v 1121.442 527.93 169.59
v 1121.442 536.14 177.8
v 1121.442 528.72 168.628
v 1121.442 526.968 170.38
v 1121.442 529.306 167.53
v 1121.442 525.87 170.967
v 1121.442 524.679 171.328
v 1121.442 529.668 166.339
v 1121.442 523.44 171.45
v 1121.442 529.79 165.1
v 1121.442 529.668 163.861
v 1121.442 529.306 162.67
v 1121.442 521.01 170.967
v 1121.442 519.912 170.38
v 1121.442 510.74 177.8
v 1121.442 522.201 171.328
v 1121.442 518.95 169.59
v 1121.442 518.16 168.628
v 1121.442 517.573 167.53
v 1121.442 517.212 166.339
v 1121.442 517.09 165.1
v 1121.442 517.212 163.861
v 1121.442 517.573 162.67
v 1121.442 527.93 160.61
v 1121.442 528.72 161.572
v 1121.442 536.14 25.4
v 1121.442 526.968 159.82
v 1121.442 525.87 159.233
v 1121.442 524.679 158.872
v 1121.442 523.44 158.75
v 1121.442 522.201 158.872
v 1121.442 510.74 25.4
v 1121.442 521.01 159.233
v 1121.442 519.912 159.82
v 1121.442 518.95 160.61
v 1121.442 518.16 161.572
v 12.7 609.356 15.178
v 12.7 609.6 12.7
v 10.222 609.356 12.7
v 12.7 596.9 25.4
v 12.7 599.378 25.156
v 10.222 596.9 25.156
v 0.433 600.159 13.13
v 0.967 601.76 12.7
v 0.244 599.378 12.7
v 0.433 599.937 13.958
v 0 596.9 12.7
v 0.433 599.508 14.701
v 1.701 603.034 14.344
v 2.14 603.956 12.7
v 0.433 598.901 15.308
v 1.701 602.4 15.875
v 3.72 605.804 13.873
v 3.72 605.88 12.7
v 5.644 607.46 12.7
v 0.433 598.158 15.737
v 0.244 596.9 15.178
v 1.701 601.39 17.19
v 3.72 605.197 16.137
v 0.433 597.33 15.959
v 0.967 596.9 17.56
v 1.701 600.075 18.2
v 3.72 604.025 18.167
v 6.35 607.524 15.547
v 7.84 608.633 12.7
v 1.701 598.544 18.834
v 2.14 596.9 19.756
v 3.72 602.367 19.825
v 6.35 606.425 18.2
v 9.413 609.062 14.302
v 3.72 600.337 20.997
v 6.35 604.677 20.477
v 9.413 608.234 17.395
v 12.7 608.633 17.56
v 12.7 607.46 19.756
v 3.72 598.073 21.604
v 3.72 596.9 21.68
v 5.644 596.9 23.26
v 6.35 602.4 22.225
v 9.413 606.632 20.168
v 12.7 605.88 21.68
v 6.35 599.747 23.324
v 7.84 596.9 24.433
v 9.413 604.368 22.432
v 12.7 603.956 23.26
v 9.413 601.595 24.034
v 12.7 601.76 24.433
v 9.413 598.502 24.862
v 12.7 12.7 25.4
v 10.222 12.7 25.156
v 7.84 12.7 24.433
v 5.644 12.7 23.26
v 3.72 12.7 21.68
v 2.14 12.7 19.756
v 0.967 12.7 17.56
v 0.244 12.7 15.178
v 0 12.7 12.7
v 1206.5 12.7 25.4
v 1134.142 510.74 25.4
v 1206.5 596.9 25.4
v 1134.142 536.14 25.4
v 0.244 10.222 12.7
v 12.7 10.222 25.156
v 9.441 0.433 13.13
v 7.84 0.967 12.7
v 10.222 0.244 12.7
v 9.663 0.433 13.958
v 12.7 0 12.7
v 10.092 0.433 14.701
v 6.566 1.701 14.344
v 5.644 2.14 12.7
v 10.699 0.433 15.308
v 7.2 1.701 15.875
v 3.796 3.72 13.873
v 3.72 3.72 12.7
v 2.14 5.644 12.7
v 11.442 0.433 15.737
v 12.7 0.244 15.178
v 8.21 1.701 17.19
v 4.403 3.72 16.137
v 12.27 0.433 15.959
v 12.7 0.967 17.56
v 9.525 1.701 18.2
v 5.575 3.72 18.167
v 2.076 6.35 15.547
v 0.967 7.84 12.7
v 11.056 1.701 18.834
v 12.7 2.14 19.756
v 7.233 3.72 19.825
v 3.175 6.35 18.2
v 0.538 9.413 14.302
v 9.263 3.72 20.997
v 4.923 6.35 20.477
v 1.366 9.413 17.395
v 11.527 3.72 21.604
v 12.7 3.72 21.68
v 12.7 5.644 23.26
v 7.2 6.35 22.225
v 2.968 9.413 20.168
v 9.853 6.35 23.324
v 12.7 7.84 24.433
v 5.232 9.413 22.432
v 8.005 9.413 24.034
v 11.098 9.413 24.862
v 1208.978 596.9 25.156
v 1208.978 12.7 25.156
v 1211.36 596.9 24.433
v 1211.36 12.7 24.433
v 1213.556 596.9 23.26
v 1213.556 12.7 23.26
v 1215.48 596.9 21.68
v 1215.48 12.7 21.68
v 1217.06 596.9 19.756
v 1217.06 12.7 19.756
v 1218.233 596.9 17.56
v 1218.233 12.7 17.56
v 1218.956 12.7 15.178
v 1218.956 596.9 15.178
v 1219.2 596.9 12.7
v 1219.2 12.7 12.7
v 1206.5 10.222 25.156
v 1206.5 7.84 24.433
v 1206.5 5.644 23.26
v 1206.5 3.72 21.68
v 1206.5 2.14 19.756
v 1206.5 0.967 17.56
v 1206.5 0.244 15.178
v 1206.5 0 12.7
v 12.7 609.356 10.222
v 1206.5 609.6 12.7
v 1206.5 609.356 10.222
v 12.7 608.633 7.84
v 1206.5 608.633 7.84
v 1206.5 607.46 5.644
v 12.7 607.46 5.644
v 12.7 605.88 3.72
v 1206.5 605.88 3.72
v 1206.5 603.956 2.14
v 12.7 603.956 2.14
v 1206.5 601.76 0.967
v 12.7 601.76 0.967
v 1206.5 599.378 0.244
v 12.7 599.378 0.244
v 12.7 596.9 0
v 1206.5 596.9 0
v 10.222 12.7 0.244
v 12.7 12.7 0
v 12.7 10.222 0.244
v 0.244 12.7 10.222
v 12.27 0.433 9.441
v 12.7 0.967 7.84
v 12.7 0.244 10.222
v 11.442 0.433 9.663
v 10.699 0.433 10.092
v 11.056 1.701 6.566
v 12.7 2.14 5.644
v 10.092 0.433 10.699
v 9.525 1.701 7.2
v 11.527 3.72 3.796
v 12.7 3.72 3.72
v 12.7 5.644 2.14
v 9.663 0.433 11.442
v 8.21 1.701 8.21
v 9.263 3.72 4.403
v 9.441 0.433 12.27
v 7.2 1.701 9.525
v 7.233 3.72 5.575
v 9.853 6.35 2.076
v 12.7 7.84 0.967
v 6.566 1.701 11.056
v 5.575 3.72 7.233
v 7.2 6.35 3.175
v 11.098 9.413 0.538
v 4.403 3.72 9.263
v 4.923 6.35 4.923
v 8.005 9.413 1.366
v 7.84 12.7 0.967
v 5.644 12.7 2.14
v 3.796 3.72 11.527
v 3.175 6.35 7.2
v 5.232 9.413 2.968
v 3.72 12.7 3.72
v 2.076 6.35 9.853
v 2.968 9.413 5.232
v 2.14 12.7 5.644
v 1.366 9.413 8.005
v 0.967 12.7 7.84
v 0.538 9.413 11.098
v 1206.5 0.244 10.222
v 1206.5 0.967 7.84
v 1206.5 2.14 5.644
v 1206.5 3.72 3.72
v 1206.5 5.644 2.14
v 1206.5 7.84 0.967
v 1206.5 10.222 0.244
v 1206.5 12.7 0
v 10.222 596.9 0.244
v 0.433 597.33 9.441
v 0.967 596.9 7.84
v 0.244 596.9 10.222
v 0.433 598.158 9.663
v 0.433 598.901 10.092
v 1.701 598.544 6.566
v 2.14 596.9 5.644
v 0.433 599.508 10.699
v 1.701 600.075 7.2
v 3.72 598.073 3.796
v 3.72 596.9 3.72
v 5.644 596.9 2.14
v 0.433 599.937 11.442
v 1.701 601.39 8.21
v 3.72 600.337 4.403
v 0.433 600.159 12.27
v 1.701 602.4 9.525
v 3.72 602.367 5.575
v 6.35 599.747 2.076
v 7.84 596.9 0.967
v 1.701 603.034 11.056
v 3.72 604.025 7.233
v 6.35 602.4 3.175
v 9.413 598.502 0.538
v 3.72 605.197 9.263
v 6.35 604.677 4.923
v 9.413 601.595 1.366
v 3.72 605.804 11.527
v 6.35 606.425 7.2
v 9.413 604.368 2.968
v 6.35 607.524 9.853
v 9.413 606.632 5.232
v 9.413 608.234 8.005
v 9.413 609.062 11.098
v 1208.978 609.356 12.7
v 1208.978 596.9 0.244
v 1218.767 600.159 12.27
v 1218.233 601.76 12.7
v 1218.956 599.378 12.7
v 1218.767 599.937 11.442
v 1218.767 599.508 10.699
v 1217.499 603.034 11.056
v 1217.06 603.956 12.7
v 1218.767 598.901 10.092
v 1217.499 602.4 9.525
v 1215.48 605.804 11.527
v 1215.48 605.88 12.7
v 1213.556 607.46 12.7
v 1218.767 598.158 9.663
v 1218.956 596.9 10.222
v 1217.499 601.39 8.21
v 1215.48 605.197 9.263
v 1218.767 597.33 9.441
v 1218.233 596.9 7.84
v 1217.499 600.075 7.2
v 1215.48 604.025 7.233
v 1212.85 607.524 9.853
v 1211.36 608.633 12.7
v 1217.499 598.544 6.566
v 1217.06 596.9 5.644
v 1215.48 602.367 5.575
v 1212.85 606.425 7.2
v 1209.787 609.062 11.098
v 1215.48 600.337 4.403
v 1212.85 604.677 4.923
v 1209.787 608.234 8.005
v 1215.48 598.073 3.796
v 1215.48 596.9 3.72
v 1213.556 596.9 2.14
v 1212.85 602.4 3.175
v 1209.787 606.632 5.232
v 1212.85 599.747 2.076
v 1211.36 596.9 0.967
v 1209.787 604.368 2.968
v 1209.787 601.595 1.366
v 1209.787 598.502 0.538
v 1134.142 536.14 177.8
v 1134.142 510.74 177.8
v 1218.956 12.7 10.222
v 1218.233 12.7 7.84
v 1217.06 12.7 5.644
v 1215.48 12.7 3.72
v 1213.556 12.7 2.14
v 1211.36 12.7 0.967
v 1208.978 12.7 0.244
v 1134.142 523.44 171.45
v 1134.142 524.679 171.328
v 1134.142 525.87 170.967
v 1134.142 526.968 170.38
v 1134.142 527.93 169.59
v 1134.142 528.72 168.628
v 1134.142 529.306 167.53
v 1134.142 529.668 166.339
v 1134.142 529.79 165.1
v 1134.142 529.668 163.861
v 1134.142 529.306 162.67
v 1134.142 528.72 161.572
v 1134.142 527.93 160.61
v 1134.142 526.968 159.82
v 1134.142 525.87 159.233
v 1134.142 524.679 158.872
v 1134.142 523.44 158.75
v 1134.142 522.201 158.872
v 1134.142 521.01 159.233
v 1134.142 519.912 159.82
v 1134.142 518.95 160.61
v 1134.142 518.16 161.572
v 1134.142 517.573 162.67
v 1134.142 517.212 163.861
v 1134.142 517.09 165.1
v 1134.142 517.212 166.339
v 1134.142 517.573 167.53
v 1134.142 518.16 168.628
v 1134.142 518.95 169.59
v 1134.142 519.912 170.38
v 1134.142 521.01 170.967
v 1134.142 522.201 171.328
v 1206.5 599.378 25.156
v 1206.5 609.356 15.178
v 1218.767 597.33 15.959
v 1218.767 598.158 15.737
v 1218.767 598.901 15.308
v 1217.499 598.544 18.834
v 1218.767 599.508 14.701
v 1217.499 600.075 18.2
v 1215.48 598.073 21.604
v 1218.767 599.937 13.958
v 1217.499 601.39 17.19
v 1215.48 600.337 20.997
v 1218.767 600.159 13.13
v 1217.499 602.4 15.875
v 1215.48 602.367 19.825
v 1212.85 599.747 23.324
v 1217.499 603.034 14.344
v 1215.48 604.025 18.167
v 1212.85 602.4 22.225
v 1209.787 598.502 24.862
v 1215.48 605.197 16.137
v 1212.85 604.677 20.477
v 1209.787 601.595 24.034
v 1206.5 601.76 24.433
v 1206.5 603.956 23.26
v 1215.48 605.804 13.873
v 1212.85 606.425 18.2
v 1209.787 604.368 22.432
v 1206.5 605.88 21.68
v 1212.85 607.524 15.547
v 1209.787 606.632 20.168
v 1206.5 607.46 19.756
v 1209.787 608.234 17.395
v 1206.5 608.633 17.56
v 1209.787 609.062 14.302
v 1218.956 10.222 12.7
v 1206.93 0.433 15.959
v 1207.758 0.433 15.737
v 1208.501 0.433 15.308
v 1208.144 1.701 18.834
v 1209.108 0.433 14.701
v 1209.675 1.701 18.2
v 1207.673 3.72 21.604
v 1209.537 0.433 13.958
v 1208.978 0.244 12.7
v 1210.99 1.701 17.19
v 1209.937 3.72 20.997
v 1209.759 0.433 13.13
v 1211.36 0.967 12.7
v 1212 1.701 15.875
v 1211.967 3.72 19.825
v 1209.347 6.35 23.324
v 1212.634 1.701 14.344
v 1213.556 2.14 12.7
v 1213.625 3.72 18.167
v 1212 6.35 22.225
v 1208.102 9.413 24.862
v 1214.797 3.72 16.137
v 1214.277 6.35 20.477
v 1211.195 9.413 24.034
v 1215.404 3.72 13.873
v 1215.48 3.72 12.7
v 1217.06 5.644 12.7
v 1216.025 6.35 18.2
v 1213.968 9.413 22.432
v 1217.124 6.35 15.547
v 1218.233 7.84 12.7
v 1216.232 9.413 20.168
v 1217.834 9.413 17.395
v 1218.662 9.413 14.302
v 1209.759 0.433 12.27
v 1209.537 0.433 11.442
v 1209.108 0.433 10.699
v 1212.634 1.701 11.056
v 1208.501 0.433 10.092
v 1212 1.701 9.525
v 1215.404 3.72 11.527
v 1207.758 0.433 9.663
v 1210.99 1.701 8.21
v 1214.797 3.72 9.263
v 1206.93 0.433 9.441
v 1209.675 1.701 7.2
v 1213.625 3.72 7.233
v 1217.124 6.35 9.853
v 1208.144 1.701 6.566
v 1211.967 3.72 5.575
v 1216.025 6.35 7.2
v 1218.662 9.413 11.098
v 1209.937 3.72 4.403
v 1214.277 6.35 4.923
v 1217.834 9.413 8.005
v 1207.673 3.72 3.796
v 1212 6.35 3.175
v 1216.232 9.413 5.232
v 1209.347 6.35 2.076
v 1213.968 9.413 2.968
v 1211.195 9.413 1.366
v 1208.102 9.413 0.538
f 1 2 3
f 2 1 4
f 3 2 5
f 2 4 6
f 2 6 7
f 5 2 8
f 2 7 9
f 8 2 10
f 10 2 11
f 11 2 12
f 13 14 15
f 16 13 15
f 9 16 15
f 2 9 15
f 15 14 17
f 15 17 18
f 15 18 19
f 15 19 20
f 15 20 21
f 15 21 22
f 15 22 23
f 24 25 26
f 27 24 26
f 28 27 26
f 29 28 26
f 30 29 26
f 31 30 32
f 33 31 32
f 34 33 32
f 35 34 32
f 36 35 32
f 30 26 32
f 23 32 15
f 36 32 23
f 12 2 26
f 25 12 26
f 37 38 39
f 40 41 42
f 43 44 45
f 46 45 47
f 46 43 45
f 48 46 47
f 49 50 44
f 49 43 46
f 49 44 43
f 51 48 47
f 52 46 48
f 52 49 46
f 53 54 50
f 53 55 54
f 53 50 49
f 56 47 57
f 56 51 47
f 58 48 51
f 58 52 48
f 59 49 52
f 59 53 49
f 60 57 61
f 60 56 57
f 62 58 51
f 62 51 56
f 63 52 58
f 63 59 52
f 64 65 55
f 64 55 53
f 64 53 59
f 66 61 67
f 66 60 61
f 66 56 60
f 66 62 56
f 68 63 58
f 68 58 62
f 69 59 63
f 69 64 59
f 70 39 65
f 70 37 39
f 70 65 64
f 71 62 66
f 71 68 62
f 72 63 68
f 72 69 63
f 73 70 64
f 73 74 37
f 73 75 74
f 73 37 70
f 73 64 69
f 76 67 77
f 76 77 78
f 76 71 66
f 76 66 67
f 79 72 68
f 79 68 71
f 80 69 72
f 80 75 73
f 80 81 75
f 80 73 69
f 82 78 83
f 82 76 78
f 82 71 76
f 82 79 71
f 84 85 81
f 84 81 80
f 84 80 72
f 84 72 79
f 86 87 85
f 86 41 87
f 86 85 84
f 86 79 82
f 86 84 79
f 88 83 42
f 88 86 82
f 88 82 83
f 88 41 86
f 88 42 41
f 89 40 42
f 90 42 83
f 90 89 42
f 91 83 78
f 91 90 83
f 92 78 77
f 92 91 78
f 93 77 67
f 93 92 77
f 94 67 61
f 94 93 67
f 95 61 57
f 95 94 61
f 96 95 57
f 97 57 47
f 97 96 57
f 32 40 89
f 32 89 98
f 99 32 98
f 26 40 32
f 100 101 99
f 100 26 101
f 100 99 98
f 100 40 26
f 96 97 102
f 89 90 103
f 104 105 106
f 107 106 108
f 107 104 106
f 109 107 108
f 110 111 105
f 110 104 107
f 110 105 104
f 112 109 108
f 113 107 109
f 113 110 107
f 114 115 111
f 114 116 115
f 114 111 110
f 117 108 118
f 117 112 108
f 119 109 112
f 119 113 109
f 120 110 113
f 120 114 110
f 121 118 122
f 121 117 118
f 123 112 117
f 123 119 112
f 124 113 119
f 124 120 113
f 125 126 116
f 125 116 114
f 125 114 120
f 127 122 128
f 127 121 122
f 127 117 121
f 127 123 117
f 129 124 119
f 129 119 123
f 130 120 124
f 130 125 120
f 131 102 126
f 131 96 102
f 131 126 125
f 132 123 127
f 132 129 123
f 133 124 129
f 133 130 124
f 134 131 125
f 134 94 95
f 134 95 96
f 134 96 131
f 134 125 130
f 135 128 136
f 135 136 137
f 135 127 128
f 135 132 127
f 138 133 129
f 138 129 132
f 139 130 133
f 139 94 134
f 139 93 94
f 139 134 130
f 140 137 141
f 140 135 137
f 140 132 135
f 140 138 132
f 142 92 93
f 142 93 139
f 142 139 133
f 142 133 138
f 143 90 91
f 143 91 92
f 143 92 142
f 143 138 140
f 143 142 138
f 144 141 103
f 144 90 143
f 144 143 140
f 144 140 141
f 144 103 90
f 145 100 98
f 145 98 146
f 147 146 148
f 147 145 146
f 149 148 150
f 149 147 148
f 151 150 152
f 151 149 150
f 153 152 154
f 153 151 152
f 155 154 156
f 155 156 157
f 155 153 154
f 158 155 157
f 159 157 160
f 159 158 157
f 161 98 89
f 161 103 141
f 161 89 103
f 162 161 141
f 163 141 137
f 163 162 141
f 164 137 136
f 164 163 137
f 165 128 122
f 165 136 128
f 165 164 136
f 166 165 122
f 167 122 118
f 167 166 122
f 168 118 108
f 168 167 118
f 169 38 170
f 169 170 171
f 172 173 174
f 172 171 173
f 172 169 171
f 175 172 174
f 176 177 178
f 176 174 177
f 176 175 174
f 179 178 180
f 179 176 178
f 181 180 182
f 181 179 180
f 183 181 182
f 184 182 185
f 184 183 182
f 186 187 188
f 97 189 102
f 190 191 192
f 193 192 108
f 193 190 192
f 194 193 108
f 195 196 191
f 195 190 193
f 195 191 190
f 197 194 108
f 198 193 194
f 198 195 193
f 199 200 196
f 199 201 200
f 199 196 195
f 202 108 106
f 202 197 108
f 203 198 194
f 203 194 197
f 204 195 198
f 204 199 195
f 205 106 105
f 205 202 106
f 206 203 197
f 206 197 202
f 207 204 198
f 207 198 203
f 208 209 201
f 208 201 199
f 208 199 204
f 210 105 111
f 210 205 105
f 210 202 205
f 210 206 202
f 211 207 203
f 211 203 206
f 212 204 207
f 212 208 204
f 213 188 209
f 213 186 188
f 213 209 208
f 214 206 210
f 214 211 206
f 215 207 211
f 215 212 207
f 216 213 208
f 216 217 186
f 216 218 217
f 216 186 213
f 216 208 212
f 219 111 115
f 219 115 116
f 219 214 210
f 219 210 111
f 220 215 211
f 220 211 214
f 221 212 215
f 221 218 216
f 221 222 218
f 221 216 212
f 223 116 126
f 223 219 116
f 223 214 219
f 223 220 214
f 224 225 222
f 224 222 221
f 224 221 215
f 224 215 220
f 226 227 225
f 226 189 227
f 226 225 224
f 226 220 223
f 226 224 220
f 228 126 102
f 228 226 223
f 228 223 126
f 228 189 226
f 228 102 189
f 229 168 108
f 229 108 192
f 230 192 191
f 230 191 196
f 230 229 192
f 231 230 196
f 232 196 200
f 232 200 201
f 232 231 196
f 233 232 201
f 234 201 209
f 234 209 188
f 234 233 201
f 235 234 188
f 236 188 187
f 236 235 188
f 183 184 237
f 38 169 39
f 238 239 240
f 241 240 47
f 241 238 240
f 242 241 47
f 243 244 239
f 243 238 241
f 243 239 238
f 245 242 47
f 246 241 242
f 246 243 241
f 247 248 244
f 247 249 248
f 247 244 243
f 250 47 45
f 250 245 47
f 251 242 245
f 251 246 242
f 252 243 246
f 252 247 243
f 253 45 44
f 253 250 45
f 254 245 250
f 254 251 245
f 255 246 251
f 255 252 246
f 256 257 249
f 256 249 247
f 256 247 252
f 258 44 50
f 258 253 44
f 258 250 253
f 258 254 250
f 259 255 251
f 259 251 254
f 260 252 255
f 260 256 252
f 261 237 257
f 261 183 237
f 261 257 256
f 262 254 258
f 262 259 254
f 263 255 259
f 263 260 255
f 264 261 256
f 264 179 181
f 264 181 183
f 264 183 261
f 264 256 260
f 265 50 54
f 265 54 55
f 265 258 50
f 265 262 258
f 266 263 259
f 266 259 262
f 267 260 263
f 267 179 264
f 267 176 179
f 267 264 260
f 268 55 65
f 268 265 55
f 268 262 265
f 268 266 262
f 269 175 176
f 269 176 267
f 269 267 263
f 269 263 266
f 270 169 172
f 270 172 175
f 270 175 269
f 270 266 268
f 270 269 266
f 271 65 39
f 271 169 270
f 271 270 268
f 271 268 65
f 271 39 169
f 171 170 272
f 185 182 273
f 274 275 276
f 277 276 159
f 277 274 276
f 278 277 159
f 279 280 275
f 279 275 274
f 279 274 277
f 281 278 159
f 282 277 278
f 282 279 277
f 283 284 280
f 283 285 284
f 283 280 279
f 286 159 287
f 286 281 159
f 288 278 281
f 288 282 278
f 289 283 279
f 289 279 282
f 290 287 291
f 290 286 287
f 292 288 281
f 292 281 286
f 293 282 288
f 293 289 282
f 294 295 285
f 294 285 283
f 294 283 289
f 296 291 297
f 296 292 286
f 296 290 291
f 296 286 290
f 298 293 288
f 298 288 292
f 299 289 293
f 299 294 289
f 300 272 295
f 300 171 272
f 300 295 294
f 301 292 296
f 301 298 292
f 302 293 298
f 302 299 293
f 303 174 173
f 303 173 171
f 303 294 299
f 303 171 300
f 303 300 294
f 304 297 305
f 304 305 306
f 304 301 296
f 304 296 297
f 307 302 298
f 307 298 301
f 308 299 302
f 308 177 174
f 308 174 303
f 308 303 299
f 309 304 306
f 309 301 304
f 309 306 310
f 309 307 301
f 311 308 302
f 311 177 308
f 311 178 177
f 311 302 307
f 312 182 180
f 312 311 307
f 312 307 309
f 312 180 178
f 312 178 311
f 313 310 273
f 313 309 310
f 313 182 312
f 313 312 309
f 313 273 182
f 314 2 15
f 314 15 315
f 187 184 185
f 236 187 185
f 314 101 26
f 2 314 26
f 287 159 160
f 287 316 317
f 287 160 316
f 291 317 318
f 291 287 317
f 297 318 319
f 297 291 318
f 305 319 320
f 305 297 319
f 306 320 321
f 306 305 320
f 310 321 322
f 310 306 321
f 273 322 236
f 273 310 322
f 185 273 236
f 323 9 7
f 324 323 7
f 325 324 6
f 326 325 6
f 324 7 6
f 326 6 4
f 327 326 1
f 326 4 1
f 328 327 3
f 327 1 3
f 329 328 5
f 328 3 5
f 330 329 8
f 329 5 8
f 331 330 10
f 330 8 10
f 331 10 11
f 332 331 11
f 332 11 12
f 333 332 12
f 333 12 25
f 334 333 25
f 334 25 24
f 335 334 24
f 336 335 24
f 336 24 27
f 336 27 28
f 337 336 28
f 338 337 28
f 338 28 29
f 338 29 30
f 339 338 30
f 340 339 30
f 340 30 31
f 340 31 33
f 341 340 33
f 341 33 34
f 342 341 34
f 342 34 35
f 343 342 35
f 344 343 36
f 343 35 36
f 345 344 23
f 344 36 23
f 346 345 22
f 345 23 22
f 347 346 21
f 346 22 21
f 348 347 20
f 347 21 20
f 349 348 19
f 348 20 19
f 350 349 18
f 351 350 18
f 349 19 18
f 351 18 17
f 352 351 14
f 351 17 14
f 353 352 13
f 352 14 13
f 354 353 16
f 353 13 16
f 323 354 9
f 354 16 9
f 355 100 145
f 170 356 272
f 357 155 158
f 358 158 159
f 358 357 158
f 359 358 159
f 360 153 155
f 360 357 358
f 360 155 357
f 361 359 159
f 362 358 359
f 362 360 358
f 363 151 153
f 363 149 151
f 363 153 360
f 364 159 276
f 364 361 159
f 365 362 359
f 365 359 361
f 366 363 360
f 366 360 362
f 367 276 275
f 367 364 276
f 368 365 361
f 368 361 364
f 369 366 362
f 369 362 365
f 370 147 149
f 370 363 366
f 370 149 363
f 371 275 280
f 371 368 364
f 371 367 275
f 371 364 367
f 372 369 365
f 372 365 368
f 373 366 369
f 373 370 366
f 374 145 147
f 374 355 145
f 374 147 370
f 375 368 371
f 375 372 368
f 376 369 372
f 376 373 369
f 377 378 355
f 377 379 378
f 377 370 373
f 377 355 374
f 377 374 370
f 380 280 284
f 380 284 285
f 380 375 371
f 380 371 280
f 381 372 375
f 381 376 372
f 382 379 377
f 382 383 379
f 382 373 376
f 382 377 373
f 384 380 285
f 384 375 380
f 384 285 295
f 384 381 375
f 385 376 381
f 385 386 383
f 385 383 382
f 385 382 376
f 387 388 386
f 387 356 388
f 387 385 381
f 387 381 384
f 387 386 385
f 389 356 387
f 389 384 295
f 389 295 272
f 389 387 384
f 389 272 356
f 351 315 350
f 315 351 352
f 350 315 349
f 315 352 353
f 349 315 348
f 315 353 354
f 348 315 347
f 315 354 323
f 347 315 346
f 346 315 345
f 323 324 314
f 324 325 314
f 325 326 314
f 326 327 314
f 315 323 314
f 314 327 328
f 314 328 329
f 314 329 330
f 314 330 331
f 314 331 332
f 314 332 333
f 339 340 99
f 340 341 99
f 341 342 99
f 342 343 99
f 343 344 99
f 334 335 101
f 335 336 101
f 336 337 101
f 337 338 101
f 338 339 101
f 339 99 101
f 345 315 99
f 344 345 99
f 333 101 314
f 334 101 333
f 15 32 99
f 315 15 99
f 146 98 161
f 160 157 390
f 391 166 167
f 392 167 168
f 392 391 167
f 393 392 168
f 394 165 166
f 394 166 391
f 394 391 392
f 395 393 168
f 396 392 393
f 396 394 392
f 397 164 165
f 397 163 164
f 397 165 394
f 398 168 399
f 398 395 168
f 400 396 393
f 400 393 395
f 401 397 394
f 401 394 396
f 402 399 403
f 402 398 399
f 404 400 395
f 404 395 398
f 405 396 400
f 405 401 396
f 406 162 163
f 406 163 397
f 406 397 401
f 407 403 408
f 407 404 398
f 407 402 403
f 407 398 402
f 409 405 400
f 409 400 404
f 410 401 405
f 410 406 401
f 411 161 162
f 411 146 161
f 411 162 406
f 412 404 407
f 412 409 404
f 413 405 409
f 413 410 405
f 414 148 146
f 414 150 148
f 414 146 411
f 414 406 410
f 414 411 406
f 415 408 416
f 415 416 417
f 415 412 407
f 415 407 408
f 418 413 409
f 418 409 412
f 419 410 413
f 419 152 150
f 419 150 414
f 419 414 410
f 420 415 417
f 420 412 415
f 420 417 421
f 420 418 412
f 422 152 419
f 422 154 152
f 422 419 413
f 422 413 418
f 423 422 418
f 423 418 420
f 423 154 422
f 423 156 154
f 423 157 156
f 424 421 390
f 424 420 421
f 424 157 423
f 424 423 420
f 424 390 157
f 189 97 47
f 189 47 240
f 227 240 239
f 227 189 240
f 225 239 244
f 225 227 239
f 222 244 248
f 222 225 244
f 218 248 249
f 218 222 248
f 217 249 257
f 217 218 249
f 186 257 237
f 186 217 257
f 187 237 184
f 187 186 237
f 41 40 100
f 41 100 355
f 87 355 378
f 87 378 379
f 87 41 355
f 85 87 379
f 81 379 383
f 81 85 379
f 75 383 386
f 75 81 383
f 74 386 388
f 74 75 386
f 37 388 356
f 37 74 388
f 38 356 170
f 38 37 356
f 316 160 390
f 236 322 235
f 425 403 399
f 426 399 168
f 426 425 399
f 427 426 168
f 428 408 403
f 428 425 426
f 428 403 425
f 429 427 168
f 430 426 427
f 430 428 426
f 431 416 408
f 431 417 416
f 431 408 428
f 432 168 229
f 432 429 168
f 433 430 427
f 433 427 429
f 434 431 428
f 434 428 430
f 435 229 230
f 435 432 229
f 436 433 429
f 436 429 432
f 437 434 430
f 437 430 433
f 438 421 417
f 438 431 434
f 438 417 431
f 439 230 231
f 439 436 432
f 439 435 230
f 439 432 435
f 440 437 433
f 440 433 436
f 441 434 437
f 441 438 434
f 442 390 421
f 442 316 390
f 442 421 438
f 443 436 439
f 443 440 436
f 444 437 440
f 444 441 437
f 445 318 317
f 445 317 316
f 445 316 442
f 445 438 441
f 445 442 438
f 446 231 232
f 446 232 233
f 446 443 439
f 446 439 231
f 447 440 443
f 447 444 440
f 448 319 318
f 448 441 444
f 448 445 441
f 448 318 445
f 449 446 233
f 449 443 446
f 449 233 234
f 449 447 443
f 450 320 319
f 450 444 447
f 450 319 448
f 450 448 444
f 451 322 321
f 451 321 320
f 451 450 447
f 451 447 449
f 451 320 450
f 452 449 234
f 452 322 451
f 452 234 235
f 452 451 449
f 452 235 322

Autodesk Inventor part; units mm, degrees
ref_plane "YZ Plane" through (0, 0, 0) normal (1, 0, 0) x (0, 1, 0)
ref_plane "XZ Plane" through (0, 0, 0) normal (0, 1, 0) x (-1, 0, 0)
ref_plane "XY Plane" through (0, 0, 0) normal (0, 0, 1) x (1, 0, 0)
sketch "Sketch1" plane through (0, 0, 0) normal (0, 0, 1) x (1, 0, 0)
  line L0 (0, 0) -> (1219.2, 0)
  line L1 (1219.2, 0) -> (1219.2, 609.6)
  line L2 (1219.2, 609.6) -> (0, 609.6)
  line L3 (0, 609.6) -> (0, 0)
  dimension "d0" = 1219.2
  dimension "d1" = 609.6
extrude "Extrusion1" add sketch "Sketch1" along normal blind 25.4
fillet "Fillet1" radius 12.7 12 edges at (609.6, 609.6, 25.4) (609.6, 609.6, 0) (1219.2, 304.8, 25.4) (1219.2, 304.8, 0) (1219.2, 609.6, 12.7) (0, 609.6, 12.7) (0, 304.8, 25.4) (0, 304.8, 0) (609.6, 0, 0) (609.6, 0, 25.4) (0, 0, 12.7) (1219.2, 0, 12.7)
sketch "Sketch3" plane through (0, 0, 25.4) normal (0, 0, 1) x (1, 0, 0)
  line L0 (1134.1424, 536.1398) -> (1121.4424, 536.1398)
  line L1 (1121.4424, 536.1398) -> (1121.4424, 510.7398)
  line L2 (1121.4424, 510.7398) -> (1134.1424, 510.7398)
  line L3 (1134.1424, 510.7398) -> (1134.1424, 536.1398)
  point P0 (0, 0)
  dimension "d11" = 12.7
  dimension "d12" = 25.4
extrude "Extrusion3" add sketch "Sketch3" along normal blind 152.4
sketch "Sketch4" plane through (1121.4424, 510.7398, 25.4) normal (-1, 0, 0) x (0, 0, 1)
  circle A0 centre (139.7, 12.7) radius 6.35
  line L0 (0, 25.4) -> (152.4, 25.4) projected
  line L1 (0, 0) -> (152.4, 0) projected
  line L2 (152.4, 25.4) -> (152.4, 0) projected
  point P0 (-25.4, -510.7398)
  dimension "d15" = 12.7
  dimension "d16" = 25.4
  dimension "d17" = 12.7
  dimension "d18" = 12.7
extrude "Extrusion4" cut sketch "Sketch4" against normal through all
properties part number "BasePlate"
